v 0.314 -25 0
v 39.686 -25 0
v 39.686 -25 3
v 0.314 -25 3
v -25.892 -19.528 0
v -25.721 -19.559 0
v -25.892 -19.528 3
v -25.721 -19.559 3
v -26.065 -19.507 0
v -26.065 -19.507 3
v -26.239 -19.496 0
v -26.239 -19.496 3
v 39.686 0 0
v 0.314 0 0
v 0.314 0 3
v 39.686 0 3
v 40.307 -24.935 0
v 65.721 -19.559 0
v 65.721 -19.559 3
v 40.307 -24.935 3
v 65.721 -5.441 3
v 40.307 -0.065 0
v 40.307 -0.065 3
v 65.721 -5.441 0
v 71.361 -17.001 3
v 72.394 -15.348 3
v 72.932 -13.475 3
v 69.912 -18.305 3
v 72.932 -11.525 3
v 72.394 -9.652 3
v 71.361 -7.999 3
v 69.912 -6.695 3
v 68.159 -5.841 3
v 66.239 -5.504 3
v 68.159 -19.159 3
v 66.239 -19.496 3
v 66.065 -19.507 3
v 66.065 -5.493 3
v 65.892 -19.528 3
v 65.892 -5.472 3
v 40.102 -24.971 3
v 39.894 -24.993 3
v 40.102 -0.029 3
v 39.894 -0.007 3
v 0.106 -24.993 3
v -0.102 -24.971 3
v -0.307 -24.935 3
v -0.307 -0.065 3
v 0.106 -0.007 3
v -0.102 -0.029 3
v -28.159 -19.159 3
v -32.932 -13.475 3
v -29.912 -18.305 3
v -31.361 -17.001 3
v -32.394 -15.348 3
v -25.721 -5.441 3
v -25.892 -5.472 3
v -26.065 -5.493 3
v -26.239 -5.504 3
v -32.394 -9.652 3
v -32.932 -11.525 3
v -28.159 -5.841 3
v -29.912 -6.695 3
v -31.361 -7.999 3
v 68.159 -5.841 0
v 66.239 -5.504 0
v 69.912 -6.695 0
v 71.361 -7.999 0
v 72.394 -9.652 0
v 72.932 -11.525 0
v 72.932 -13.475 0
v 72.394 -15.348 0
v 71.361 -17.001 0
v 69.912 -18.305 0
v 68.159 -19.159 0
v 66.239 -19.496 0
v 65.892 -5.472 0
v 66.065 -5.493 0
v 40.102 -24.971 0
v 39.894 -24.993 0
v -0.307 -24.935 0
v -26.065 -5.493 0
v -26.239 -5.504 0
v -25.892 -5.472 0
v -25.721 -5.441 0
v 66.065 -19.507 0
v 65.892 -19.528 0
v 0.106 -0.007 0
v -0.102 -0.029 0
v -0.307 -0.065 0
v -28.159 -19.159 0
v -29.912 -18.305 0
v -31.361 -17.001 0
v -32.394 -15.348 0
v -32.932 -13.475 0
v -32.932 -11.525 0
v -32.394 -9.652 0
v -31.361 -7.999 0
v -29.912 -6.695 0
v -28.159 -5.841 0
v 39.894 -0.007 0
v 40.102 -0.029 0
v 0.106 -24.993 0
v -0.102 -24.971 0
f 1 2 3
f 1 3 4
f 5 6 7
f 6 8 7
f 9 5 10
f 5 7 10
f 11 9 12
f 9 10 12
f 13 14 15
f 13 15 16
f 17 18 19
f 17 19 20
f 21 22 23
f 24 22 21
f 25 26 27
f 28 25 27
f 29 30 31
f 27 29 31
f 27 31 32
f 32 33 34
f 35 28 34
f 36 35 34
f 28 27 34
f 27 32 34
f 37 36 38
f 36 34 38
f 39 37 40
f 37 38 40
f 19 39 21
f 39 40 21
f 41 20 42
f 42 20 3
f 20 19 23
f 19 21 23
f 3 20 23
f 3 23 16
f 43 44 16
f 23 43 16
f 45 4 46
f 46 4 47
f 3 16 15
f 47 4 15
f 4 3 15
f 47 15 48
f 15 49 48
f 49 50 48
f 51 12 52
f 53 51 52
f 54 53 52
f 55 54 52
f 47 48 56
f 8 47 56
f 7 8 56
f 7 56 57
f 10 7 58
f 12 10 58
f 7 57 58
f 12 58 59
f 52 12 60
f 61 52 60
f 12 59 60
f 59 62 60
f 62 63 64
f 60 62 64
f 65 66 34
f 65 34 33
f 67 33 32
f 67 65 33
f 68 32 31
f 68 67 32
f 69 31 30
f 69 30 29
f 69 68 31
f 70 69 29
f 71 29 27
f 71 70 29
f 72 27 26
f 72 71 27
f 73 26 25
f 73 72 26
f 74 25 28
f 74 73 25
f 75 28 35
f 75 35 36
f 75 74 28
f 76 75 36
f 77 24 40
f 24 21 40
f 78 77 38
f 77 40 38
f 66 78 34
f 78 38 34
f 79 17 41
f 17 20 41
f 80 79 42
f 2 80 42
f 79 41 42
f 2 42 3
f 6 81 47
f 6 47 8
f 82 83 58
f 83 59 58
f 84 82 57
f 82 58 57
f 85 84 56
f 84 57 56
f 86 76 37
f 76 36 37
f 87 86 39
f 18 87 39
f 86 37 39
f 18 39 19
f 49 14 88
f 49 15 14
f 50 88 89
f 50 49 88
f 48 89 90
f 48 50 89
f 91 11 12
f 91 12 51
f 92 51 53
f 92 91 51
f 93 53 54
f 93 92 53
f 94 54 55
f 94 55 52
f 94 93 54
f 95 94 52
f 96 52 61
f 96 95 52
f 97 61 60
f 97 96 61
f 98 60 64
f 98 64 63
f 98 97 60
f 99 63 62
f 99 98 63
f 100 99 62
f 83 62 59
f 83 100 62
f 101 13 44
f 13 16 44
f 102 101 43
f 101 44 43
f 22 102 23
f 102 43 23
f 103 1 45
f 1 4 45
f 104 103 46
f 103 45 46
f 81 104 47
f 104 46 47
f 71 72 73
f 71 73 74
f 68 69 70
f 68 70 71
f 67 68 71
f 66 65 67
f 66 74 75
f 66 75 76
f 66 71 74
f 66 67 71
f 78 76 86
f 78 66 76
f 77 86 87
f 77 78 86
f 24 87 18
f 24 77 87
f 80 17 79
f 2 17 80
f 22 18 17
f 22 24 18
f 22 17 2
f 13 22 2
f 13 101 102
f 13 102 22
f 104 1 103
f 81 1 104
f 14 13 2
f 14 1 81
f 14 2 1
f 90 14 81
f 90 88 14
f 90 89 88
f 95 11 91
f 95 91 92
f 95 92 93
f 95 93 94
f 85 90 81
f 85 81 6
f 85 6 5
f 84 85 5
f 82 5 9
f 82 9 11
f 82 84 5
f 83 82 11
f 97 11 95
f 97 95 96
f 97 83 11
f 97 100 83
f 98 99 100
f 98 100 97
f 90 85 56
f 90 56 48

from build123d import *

# Parameters (mm, degrees)
BOSS_EXTRUDE1_DEPTH = 3
FILLET1_R           = 3


with BuildPart() as part:
    # Sketch1 → Boss-Extrude1 (new body)
    with BuildSketch(Plane.XY):
        with BuildLine():
            Line((0, 0), (40, 0))
            Line((40, 0), (66, -5.5))
            ThreePointArc((66, -5.5), (73, -12.5), (66, -19.5))
            Line((66, -19.5), (40, -25))
            Line((40, -25), (0, -25))
            Line((0, -25), (-26, -19.5))
            ThreePointArc((-26, -19.5), (-33, -12.5), (-26, -5.5))
            Line((-26, -5.5), (0, 0))
        make_face()
    extrude(amount=BOSS_EXTRUDE1_DEPTH)

    # Fillet1
    fillet1_edges = [part.edges().sort_by_distance(p)[0] for p in [
        (0, 0, 1.5),
        (40, 0, 1.5),
        (66, -5.5, 1.5),
        (66, -19.5, 1.5),
        (40, -25, 1.5),
        (0, -25, 1.5),
        (-26, -19.5, 1.5),
        (-26, -5.5, 1.5),
    ]]
    fillet(fillet1_edges, radius=FILLET1_R)


solid = part.part
